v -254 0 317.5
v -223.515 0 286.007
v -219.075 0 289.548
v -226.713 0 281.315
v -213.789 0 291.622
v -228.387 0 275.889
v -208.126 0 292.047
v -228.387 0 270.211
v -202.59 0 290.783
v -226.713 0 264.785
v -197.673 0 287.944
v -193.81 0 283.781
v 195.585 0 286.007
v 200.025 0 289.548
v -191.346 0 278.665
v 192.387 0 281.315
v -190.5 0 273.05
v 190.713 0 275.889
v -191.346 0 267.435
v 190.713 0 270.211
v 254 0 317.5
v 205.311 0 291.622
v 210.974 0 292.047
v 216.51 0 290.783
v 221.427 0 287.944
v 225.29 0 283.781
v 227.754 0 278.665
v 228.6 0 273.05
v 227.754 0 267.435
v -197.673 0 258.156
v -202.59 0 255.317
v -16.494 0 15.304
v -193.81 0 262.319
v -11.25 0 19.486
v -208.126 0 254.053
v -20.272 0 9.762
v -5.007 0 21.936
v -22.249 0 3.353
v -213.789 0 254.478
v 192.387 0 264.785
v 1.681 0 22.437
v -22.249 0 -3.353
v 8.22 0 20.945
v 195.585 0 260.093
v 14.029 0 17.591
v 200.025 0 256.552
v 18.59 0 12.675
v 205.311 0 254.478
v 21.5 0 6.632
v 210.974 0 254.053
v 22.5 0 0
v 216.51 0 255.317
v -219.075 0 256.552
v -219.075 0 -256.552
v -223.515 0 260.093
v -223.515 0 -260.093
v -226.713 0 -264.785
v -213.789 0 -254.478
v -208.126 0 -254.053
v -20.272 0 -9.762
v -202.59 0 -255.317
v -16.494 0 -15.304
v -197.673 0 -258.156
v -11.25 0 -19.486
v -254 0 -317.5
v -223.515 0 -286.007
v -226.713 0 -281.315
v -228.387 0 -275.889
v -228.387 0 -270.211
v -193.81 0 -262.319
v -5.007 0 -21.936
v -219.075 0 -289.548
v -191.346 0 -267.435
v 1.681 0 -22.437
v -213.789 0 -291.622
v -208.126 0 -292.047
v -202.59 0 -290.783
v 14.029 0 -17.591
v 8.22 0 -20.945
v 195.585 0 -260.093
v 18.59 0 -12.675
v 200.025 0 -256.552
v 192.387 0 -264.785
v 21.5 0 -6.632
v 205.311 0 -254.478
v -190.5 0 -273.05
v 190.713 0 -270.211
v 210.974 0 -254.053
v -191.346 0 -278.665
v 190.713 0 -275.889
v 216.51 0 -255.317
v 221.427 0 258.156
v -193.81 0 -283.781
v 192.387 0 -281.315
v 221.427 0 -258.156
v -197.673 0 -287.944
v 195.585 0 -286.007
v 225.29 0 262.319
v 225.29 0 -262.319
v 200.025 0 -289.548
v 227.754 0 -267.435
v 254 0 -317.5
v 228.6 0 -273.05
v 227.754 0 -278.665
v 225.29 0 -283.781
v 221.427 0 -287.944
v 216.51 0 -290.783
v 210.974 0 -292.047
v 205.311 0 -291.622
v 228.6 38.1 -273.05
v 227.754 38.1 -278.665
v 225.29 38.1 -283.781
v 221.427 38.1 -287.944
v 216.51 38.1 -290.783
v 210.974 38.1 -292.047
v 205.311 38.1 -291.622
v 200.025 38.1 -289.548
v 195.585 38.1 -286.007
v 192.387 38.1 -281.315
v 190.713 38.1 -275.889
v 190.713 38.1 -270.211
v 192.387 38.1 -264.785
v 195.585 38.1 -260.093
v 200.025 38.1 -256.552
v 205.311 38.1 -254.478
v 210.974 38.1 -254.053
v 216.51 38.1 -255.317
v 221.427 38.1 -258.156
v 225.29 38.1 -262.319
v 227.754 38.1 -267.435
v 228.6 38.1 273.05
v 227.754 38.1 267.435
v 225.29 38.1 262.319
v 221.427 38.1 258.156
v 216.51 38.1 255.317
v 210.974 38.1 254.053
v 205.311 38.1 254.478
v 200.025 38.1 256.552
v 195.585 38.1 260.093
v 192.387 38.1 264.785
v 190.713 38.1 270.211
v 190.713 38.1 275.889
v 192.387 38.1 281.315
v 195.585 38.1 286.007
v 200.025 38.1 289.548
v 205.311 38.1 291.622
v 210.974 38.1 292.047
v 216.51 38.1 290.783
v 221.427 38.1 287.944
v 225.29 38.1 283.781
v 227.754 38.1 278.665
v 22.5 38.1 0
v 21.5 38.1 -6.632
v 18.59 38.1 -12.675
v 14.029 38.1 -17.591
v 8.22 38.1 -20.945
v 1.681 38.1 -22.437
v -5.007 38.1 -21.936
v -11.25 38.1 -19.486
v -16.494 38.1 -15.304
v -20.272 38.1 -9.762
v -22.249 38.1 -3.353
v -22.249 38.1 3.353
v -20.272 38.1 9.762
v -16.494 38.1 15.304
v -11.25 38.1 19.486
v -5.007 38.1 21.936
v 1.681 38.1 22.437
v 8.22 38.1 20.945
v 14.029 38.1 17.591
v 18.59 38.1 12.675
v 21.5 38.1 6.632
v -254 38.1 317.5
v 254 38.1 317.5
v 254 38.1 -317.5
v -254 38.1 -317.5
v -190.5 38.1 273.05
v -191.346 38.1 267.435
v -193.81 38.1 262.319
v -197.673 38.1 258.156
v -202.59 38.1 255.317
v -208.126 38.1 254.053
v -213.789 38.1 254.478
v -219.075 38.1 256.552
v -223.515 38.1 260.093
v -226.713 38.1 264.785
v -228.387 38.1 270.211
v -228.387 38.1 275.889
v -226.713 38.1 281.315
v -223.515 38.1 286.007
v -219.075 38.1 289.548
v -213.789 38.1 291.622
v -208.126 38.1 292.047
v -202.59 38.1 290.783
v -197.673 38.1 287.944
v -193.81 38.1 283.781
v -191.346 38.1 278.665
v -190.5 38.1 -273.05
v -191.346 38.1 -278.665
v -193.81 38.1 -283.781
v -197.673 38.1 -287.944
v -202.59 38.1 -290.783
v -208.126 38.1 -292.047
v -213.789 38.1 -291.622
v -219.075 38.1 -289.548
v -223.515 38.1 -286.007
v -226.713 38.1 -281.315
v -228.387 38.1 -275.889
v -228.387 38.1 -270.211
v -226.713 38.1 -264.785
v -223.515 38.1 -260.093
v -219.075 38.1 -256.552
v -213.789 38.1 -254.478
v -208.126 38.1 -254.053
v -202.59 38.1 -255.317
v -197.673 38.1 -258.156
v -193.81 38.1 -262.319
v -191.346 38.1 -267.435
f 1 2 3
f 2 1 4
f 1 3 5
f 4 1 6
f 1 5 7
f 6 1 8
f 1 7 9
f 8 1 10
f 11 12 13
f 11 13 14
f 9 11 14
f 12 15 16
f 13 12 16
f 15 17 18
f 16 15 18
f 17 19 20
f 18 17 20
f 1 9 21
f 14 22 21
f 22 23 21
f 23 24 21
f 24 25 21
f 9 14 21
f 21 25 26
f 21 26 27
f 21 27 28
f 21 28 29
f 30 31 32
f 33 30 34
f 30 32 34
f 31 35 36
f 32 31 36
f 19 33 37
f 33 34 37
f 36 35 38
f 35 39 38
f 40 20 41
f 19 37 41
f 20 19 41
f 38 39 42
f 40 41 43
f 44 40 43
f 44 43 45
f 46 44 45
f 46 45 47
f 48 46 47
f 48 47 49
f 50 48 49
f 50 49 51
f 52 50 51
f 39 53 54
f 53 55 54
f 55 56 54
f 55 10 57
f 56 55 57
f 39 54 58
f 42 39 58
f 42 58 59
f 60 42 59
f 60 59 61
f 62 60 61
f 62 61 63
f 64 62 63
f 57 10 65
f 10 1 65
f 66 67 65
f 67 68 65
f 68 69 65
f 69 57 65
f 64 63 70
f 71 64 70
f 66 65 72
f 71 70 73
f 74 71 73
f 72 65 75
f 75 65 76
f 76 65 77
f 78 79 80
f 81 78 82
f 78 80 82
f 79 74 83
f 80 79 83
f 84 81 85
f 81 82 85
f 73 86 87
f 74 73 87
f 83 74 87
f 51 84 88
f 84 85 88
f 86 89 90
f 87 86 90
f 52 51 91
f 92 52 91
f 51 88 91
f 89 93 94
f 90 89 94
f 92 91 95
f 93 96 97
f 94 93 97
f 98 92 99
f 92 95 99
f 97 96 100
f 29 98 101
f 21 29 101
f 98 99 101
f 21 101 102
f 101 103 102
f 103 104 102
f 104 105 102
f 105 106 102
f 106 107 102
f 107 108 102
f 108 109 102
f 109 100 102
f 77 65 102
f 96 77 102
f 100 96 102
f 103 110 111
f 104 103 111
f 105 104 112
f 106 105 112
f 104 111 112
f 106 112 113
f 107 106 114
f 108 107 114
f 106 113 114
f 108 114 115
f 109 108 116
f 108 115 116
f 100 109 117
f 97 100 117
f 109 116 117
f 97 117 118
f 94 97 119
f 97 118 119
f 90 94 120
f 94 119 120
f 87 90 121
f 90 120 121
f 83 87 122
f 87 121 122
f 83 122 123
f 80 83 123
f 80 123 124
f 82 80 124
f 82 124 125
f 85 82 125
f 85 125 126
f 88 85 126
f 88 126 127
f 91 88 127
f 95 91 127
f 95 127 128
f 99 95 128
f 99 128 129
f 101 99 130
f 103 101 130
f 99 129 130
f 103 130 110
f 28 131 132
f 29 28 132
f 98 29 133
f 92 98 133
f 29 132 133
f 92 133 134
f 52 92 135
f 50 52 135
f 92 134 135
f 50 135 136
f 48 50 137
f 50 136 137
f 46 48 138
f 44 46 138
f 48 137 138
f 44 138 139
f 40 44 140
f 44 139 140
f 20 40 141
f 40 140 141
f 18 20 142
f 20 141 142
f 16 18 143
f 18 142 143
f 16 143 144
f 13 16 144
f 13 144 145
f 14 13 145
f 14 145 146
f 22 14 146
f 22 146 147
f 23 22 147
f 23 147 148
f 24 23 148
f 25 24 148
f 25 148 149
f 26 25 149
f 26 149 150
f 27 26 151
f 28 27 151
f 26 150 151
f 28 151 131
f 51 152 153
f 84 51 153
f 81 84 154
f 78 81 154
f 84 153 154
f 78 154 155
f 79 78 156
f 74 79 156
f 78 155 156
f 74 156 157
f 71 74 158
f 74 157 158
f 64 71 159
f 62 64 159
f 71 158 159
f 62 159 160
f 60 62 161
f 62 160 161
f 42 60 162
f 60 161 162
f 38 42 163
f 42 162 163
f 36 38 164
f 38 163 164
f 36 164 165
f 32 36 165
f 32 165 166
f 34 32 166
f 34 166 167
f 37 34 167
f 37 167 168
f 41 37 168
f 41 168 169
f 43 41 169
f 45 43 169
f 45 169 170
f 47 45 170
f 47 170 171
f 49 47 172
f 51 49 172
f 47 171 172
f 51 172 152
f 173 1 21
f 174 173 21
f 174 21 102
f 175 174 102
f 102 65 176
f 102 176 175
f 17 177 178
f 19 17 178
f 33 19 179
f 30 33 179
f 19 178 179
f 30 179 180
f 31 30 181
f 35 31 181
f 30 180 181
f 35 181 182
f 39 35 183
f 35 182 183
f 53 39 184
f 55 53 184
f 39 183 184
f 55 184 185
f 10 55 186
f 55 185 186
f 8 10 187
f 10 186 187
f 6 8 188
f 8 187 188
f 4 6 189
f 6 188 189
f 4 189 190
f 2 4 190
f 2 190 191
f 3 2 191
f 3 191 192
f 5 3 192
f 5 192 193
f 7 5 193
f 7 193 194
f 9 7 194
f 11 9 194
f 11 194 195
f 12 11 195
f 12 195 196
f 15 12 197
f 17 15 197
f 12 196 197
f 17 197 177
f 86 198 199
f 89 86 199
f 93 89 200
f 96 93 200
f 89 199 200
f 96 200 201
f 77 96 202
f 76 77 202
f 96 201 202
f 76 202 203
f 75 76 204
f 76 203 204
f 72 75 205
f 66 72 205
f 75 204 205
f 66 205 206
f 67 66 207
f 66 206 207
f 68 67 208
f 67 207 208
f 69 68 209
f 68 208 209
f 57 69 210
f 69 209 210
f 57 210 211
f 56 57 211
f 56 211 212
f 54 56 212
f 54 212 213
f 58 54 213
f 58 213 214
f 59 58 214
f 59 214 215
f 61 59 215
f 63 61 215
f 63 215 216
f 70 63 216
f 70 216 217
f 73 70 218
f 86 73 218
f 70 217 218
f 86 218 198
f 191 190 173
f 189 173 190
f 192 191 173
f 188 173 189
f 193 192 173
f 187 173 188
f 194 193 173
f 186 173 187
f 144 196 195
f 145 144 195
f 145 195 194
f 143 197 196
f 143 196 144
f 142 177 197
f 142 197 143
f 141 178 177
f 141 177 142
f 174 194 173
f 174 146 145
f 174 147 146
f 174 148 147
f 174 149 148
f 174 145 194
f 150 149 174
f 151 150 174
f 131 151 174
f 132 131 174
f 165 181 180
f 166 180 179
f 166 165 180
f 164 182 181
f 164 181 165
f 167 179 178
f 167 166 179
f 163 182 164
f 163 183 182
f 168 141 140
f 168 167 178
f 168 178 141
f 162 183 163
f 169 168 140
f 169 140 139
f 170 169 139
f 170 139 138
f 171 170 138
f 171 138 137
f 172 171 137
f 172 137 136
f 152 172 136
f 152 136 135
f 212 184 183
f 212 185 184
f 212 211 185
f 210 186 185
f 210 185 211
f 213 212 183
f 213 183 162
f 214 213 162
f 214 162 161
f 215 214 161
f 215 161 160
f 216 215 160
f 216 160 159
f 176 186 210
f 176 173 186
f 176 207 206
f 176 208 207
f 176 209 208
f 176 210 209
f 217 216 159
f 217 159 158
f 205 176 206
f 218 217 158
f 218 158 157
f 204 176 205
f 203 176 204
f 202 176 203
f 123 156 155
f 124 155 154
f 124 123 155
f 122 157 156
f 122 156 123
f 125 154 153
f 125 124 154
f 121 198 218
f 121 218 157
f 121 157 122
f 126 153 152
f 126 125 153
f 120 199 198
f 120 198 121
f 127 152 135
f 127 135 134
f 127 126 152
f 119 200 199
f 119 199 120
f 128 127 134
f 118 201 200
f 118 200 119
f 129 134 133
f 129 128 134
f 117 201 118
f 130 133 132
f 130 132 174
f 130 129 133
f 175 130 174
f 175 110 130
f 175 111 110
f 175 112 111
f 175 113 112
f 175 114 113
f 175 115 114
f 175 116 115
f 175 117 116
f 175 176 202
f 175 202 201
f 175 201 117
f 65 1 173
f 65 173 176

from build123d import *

# Parameters (mm, degrees)
CROQUIS2_W              = 508
CROQUIS2_H              = 635
SALIENTE_EXTRUIR2_DEPTH = 38.1
CROQUIS3_R              = 19.05
CORTAR_EXTRUIR1_DEPTH   = 38.1
CROQUIS4_R              = 22.5
CORTAR_EXTRUIR2_DEPTH   = 38.1


with BuildPart() as part:
    # Croquis2 → Saliente-Extruir2 (new body)
    with BuildSketch(Plane(origin=(0, 0, 0), x_dir=(1, 0, 0), z_dir=(0, 1, 0))):
        Rectangle(CROQUIS2_W, CROQUIS2_H)
    extrude(amount=SALIENTE_EXTRUIR2_DEPTH)

    # Croquis3 → Cortar-Extruir1 (cut)
    with BuildSketch(Plane(origin=(0, 38.1, 0), x_dir=(1, 0, 0), z_dir=(0, 1, 0))):
        with Locations((-209.55, 273.05)):
            Circle(CROQUIS3_R)
        with Locations((209.55, 273.05)):
            Circle(CROQUIS3_R)
        with Locations((209.55, -273.05)):
            Circle(CROQUIS3_R)
        with Locations((-209.55, -273.05)):
            Circle(CROQUIS3_R)
    extrude(amount=-CORTAR_EXTRUIR1_DEPTH, mode=Mode.SUBTRACT)

    # Croquis4 → Cortar-Extruir2 (cut)
    with BuildSketch(Plane(origin=(0, 38.1, 0), x_dir=(1, 0, 0), z_dir=(0, 1, 0))):
        Circle(CROQUIS4_R)
    extrude(amount=-CORTAR_EXTRUIR2_DEPTH, mode=Mode.SUBTRACT)


solid = part.part
